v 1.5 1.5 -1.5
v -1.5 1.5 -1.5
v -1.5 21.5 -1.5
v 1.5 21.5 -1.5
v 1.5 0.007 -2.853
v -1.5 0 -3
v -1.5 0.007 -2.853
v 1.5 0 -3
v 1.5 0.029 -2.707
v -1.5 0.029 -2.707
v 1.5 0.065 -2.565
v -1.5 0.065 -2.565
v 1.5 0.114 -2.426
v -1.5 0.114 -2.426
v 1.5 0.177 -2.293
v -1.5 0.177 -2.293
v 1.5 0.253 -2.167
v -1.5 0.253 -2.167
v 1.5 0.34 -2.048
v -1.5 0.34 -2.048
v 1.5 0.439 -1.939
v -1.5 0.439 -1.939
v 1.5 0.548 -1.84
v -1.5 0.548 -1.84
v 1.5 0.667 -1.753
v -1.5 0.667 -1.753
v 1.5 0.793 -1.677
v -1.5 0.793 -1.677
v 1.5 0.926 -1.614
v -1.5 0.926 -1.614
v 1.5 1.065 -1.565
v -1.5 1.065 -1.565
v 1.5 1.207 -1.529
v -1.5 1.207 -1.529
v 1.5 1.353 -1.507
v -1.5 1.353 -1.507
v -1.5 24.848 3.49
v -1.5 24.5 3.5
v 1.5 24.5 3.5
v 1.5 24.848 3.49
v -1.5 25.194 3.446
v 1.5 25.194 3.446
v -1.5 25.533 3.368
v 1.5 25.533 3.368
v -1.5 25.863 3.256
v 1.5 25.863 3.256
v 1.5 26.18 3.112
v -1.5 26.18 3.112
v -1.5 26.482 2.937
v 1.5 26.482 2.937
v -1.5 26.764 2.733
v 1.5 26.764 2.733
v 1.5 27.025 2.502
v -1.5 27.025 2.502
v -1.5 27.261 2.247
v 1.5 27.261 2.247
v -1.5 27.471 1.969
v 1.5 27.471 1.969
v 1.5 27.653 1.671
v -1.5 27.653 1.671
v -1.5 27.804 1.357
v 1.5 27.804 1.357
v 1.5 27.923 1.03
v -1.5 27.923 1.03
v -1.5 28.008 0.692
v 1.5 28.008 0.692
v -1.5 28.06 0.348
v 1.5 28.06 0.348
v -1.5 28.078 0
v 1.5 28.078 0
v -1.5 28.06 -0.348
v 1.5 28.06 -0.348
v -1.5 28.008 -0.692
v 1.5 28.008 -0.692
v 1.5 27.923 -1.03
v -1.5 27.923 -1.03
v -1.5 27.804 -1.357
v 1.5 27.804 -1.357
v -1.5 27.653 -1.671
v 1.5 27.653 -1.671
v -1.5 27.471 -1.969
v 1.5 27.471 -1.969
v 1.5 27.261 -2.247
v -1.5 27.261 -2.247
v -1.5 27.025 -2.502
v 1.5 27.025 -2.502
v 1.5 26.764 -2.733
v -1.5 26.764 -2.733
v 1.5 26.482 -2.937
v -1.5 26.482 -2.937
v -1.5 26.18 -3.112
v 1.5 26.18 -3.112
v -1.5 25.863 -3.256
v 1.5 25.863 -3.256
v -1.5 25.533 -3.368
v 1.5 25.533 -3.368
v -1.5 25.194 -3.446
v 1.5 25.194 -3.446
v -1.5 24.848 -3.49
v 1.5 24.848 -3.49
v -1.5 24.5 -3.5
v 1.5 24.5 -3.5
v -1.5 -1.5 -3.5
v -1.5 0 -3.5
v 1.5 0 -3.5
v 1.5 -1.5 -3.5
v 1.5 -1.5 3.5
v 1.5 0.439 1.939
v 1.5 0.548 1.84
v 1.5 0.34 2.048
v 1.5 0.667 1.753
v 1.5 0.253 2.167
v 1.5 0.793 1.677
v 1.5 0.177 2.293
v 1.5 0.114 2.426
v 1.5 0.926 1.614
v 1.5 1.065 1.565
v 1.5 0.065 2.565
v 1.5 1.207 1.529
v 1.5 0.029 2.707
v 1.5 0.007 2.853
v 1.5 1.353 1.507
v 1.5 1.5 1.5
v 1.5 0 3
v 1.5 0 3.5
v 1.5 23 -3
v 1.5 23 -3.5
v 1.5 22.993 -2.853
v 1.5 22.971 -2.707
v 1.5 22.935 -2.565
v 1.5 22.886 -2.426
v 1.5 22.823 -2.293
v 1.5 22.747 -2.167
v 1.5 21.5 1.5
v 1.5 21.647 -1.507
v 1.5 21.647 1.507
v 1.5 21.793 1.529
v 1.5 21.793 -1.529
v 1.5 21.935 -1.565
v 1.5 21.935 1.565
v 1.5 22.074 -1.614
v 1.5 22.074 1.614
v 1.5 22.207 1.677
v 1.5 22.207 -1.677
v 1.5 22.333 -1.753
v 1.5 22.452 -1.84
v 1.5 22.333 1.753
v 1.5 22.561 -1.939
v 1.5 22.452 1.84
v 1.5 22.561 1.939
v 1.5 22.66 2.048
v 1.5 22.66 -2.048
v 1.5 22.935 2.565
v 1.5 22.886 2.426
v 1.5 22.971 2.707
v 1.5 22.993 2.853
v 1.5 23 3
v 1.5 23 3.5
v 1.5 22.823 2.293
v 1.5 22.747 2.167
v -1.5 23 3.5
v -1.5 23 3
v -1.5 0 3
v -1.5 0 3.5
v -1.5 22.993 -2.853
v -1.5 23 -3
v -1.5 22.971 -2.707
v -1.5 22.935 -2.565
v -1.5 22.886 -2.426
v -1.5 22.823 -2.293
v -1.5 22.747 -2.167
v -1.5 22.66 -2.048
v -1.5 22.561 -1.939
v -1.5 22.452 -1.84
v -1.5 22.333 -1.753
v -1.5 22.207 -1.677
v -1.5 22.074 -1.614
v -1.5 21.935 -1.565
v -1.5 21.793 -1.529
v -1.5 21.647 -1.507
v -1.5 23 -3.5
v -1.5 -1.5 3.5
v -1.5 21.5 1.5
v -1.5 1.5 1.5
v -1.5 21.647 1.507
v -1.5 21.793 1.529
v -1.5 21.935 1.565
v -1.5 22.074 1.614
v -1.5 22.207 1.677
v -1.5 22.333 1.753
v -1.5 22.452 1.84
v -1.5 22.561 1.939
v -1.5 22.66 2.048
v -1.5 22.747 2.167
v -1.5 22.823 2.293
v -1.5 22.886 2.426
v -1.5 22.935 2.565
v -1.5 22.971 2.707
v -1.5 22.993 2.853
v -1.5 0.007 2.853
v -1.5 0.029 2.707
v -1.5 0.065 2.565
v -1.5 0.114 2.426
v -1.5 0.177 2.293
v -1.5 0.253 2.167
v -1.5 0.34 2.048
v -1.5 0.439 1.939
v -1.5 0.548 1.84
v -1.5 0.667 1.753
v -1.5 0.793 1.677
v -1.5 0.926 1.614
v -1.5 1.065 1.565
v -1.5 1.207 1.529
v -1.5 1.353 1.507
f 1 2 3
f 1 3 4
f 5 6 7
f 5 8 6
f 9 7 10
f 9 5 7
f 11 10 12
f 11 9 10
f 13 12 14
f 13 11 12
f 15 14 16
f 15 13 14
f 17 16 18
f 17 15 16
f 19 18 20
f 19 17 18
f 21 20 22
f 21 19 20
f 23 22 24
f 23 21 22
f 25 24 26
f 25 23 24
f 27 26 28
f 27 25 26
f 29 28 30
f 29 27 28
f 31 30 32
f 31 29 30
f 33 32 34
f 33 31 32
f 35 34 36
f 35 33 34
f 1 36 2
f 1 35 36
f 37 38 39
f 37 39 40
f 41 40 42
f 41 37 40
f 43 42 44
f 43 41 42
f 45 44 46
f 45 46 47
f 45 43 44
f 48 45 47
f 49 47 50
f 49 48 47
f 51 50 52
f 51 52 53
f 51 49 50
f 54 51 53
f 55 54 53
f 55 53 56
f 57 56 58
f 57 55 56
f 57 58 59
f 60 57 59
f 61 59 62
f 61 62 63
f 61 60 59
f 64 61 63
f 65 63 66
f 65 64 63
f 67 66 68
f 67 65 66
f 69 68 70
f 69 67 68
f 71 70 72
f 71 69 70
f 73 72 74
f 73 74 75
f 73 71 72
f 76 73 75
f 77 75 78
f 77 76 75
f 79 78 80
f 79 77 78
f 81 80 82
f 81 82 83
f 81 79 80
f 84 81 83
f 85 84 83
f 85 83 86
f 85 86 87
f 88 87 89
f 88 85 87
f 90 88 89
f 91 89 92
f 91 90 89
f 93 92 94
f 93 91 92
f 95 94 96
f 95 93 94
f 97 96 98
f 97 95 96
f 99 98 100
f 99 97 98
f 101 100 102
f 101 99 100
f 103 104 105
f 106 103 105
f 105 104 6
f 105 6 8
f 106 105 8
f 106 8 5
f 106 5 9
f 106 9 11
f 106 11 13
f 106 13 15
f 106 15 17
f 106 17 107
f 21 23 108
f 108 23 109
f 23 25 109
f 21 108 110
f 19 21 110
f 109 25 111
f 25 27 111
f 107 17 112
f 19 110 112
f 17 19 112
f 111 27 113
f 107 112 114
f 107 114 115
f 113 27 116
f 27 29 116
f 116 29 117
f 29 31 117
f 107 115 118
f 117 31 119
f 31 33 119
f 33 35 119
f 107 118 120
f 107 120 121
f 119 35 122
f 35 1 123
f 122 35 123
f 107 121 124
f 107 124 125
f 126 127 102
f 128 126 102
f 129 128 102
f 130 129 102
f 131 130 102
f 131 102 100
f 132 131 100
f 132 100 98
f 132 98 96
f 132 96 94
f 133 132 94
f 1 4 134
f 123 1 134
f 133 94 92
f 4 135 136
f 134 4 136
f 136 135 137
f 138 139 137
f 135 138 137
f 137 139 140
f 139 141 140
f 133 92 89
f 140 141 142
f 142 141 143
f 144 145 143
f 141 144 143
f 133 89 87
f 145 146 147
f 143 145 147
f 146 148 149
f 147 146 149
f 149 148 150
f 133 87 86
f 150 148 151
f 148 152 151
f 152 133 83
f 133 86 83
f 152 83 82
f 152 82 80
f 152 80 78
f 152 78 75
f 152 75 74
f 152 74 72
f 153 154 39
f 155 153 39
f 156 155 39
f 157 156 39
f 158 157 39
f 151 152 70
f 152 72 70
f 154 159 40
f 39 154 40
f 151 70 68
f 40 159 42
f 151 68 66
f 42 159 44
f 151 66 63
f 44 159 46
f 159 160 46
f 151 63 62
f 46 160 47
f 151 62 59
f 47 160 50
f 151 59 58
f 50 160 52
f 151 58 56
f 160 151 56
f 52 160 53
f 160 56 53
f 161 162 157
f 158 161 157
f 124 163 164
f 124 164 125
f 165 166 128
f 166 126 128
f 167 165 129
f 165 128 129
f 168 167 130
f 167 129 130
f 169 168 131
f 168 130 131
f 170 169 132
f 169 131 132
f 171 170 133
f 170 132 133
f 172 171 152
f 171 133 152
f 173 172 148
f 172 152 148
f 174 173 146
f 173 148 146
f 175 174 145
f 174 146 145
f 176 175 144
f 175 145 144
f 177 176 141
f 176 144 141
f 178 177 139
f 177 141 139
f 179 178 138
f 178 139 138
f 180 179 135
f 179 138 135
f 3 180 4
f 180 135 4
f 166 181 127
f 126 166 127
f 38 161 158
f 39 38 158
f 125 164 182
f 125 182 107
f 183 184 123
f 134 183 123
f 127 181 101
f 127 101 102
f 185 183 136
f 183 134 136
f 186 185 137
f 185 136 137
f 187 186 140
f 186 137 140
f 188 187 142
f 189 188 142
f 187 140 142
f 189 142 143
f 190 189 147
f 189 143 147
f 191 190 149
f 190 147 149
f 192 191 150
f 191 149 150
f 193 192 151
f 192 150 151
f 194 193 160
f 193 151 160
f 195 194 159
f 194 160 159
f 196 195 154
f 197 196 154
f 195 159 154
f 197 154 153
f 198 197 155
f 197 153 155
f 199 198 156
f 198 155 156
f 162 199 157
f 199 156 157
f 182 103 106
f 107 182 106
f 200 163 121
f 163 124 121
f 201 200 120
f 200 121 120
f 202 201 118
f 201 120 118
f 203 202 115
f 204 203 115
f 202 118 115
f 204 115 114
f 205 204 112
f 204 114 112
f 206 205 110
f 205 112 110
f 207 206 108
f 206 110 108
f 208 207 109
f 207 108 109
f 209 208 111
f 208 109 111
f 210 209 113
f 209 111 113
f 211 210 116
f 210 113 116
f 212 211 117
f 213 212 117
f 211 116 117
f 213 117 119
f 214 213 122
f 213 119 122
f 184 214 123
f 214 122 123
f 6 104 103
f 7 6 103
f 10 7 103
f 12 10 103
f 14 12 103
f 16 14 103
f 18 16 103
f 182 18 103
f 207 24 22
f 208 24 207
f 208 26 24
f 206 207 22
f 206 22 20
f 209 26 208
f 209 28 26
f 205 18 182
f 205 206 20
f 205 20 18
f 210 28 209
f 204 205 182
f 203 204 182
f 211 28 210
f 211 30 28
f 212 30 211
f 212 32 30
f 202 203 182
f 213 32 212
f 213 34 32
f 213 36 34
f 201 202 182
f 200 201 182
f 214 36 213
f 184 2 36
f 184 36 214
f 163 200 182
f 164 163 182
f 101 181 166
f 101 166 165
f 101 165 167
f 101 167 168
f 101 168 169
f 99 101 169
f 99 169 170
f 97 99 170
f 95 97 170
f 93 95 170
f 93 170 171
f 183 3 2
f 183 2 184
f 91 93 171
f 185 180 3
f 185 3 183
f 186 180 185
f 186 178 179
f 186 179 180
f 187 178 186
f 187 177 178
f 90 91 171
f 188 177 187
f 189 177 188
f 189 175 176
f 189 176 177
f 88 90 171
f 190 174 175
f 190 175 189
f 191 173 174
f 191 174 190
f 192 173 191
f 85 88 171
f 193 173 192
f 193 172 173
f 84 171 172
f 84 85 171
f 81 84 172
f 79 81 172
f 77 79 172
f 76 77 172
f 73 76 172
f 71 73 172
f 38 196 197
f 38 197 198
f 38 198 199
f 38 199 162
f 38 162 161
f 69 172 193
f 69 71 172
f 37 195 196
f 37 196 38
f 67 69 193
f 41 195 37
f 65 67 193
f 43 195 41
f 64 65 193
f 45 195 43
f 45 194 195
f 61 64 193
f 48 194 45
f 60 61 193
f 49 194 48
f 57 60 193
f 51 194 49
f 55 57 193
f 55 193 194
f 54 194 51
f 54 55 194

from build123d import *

# Parameters (mm, degrees)
SKETCH1_W           = 3
SKETCH1_H           = 3
BOSS_EXTRUDE1_DEPTH = 23
SKETCH3_W           = 3
SKETCH3_H           = 7
BOSS_EXTRUDE2_DEPTH = 1.5
FILLET1_R           = 1.5
BOSS_EXTRUDE3_DEPTH = 3


with BuildPart() as part:
    # Sketch1 → Boss-Extrude1 (new body)
    with BuildSketch(Plane(origin=(0, 0, 0), x_dir=(1, 0, 0), z_dir=(0, 1, 0))):
        Rectangle(SKETCH1_W, SKETCH1_H)
    extrude(amount=BOSS_EXTRUDE1_DEPTH)

    # Sketch3 → Boss-Extrude2 (add)
    with BuildSketch(Plane(origin=(0, 23, 0), x_dir=(1, 0, 0), z_dir=(0, 1, 0))):
        Rectangle(SKETCH3_W, SKETCH3_H)
    boss_extrude2 = extrude(amount=BOSS_EXTRUDE2_DEPTH)

    # Mirror2: Boss-Extrude2 across plane
    add(boss_extrude2.mirror(Plane(origin=(0, 11.5, 0), x_dir=(0, 0, 1), z_dir=(0, -1, 0))))

    # Fillet1
    fillet1_edges = [part.edges().sort_by_distance(p)[0] for p in [
        (0, 23, 1.5),
        (0, 0, 1.5),
        (0, 0, -1.5),
        (0, 23, -1.5),
    ]]
    fillet(fillet1_edges, radius=FILLET1_R)

    # Sketch4 → Boss-Extrude3 (add)
    with BuildSketch(Plane.ZY.offset(1.5)):
        with BuildLine():
            Line((-3.5, 24.5), (3.5, 24.5))
            ThreePointArc((3.5, 24.5), (0, 28.077563248), (-3.5, 24.5))
        make_face()
    extrude(amount=-BOSS_EXTRUDE3_DEPTH)


solid = part.part
